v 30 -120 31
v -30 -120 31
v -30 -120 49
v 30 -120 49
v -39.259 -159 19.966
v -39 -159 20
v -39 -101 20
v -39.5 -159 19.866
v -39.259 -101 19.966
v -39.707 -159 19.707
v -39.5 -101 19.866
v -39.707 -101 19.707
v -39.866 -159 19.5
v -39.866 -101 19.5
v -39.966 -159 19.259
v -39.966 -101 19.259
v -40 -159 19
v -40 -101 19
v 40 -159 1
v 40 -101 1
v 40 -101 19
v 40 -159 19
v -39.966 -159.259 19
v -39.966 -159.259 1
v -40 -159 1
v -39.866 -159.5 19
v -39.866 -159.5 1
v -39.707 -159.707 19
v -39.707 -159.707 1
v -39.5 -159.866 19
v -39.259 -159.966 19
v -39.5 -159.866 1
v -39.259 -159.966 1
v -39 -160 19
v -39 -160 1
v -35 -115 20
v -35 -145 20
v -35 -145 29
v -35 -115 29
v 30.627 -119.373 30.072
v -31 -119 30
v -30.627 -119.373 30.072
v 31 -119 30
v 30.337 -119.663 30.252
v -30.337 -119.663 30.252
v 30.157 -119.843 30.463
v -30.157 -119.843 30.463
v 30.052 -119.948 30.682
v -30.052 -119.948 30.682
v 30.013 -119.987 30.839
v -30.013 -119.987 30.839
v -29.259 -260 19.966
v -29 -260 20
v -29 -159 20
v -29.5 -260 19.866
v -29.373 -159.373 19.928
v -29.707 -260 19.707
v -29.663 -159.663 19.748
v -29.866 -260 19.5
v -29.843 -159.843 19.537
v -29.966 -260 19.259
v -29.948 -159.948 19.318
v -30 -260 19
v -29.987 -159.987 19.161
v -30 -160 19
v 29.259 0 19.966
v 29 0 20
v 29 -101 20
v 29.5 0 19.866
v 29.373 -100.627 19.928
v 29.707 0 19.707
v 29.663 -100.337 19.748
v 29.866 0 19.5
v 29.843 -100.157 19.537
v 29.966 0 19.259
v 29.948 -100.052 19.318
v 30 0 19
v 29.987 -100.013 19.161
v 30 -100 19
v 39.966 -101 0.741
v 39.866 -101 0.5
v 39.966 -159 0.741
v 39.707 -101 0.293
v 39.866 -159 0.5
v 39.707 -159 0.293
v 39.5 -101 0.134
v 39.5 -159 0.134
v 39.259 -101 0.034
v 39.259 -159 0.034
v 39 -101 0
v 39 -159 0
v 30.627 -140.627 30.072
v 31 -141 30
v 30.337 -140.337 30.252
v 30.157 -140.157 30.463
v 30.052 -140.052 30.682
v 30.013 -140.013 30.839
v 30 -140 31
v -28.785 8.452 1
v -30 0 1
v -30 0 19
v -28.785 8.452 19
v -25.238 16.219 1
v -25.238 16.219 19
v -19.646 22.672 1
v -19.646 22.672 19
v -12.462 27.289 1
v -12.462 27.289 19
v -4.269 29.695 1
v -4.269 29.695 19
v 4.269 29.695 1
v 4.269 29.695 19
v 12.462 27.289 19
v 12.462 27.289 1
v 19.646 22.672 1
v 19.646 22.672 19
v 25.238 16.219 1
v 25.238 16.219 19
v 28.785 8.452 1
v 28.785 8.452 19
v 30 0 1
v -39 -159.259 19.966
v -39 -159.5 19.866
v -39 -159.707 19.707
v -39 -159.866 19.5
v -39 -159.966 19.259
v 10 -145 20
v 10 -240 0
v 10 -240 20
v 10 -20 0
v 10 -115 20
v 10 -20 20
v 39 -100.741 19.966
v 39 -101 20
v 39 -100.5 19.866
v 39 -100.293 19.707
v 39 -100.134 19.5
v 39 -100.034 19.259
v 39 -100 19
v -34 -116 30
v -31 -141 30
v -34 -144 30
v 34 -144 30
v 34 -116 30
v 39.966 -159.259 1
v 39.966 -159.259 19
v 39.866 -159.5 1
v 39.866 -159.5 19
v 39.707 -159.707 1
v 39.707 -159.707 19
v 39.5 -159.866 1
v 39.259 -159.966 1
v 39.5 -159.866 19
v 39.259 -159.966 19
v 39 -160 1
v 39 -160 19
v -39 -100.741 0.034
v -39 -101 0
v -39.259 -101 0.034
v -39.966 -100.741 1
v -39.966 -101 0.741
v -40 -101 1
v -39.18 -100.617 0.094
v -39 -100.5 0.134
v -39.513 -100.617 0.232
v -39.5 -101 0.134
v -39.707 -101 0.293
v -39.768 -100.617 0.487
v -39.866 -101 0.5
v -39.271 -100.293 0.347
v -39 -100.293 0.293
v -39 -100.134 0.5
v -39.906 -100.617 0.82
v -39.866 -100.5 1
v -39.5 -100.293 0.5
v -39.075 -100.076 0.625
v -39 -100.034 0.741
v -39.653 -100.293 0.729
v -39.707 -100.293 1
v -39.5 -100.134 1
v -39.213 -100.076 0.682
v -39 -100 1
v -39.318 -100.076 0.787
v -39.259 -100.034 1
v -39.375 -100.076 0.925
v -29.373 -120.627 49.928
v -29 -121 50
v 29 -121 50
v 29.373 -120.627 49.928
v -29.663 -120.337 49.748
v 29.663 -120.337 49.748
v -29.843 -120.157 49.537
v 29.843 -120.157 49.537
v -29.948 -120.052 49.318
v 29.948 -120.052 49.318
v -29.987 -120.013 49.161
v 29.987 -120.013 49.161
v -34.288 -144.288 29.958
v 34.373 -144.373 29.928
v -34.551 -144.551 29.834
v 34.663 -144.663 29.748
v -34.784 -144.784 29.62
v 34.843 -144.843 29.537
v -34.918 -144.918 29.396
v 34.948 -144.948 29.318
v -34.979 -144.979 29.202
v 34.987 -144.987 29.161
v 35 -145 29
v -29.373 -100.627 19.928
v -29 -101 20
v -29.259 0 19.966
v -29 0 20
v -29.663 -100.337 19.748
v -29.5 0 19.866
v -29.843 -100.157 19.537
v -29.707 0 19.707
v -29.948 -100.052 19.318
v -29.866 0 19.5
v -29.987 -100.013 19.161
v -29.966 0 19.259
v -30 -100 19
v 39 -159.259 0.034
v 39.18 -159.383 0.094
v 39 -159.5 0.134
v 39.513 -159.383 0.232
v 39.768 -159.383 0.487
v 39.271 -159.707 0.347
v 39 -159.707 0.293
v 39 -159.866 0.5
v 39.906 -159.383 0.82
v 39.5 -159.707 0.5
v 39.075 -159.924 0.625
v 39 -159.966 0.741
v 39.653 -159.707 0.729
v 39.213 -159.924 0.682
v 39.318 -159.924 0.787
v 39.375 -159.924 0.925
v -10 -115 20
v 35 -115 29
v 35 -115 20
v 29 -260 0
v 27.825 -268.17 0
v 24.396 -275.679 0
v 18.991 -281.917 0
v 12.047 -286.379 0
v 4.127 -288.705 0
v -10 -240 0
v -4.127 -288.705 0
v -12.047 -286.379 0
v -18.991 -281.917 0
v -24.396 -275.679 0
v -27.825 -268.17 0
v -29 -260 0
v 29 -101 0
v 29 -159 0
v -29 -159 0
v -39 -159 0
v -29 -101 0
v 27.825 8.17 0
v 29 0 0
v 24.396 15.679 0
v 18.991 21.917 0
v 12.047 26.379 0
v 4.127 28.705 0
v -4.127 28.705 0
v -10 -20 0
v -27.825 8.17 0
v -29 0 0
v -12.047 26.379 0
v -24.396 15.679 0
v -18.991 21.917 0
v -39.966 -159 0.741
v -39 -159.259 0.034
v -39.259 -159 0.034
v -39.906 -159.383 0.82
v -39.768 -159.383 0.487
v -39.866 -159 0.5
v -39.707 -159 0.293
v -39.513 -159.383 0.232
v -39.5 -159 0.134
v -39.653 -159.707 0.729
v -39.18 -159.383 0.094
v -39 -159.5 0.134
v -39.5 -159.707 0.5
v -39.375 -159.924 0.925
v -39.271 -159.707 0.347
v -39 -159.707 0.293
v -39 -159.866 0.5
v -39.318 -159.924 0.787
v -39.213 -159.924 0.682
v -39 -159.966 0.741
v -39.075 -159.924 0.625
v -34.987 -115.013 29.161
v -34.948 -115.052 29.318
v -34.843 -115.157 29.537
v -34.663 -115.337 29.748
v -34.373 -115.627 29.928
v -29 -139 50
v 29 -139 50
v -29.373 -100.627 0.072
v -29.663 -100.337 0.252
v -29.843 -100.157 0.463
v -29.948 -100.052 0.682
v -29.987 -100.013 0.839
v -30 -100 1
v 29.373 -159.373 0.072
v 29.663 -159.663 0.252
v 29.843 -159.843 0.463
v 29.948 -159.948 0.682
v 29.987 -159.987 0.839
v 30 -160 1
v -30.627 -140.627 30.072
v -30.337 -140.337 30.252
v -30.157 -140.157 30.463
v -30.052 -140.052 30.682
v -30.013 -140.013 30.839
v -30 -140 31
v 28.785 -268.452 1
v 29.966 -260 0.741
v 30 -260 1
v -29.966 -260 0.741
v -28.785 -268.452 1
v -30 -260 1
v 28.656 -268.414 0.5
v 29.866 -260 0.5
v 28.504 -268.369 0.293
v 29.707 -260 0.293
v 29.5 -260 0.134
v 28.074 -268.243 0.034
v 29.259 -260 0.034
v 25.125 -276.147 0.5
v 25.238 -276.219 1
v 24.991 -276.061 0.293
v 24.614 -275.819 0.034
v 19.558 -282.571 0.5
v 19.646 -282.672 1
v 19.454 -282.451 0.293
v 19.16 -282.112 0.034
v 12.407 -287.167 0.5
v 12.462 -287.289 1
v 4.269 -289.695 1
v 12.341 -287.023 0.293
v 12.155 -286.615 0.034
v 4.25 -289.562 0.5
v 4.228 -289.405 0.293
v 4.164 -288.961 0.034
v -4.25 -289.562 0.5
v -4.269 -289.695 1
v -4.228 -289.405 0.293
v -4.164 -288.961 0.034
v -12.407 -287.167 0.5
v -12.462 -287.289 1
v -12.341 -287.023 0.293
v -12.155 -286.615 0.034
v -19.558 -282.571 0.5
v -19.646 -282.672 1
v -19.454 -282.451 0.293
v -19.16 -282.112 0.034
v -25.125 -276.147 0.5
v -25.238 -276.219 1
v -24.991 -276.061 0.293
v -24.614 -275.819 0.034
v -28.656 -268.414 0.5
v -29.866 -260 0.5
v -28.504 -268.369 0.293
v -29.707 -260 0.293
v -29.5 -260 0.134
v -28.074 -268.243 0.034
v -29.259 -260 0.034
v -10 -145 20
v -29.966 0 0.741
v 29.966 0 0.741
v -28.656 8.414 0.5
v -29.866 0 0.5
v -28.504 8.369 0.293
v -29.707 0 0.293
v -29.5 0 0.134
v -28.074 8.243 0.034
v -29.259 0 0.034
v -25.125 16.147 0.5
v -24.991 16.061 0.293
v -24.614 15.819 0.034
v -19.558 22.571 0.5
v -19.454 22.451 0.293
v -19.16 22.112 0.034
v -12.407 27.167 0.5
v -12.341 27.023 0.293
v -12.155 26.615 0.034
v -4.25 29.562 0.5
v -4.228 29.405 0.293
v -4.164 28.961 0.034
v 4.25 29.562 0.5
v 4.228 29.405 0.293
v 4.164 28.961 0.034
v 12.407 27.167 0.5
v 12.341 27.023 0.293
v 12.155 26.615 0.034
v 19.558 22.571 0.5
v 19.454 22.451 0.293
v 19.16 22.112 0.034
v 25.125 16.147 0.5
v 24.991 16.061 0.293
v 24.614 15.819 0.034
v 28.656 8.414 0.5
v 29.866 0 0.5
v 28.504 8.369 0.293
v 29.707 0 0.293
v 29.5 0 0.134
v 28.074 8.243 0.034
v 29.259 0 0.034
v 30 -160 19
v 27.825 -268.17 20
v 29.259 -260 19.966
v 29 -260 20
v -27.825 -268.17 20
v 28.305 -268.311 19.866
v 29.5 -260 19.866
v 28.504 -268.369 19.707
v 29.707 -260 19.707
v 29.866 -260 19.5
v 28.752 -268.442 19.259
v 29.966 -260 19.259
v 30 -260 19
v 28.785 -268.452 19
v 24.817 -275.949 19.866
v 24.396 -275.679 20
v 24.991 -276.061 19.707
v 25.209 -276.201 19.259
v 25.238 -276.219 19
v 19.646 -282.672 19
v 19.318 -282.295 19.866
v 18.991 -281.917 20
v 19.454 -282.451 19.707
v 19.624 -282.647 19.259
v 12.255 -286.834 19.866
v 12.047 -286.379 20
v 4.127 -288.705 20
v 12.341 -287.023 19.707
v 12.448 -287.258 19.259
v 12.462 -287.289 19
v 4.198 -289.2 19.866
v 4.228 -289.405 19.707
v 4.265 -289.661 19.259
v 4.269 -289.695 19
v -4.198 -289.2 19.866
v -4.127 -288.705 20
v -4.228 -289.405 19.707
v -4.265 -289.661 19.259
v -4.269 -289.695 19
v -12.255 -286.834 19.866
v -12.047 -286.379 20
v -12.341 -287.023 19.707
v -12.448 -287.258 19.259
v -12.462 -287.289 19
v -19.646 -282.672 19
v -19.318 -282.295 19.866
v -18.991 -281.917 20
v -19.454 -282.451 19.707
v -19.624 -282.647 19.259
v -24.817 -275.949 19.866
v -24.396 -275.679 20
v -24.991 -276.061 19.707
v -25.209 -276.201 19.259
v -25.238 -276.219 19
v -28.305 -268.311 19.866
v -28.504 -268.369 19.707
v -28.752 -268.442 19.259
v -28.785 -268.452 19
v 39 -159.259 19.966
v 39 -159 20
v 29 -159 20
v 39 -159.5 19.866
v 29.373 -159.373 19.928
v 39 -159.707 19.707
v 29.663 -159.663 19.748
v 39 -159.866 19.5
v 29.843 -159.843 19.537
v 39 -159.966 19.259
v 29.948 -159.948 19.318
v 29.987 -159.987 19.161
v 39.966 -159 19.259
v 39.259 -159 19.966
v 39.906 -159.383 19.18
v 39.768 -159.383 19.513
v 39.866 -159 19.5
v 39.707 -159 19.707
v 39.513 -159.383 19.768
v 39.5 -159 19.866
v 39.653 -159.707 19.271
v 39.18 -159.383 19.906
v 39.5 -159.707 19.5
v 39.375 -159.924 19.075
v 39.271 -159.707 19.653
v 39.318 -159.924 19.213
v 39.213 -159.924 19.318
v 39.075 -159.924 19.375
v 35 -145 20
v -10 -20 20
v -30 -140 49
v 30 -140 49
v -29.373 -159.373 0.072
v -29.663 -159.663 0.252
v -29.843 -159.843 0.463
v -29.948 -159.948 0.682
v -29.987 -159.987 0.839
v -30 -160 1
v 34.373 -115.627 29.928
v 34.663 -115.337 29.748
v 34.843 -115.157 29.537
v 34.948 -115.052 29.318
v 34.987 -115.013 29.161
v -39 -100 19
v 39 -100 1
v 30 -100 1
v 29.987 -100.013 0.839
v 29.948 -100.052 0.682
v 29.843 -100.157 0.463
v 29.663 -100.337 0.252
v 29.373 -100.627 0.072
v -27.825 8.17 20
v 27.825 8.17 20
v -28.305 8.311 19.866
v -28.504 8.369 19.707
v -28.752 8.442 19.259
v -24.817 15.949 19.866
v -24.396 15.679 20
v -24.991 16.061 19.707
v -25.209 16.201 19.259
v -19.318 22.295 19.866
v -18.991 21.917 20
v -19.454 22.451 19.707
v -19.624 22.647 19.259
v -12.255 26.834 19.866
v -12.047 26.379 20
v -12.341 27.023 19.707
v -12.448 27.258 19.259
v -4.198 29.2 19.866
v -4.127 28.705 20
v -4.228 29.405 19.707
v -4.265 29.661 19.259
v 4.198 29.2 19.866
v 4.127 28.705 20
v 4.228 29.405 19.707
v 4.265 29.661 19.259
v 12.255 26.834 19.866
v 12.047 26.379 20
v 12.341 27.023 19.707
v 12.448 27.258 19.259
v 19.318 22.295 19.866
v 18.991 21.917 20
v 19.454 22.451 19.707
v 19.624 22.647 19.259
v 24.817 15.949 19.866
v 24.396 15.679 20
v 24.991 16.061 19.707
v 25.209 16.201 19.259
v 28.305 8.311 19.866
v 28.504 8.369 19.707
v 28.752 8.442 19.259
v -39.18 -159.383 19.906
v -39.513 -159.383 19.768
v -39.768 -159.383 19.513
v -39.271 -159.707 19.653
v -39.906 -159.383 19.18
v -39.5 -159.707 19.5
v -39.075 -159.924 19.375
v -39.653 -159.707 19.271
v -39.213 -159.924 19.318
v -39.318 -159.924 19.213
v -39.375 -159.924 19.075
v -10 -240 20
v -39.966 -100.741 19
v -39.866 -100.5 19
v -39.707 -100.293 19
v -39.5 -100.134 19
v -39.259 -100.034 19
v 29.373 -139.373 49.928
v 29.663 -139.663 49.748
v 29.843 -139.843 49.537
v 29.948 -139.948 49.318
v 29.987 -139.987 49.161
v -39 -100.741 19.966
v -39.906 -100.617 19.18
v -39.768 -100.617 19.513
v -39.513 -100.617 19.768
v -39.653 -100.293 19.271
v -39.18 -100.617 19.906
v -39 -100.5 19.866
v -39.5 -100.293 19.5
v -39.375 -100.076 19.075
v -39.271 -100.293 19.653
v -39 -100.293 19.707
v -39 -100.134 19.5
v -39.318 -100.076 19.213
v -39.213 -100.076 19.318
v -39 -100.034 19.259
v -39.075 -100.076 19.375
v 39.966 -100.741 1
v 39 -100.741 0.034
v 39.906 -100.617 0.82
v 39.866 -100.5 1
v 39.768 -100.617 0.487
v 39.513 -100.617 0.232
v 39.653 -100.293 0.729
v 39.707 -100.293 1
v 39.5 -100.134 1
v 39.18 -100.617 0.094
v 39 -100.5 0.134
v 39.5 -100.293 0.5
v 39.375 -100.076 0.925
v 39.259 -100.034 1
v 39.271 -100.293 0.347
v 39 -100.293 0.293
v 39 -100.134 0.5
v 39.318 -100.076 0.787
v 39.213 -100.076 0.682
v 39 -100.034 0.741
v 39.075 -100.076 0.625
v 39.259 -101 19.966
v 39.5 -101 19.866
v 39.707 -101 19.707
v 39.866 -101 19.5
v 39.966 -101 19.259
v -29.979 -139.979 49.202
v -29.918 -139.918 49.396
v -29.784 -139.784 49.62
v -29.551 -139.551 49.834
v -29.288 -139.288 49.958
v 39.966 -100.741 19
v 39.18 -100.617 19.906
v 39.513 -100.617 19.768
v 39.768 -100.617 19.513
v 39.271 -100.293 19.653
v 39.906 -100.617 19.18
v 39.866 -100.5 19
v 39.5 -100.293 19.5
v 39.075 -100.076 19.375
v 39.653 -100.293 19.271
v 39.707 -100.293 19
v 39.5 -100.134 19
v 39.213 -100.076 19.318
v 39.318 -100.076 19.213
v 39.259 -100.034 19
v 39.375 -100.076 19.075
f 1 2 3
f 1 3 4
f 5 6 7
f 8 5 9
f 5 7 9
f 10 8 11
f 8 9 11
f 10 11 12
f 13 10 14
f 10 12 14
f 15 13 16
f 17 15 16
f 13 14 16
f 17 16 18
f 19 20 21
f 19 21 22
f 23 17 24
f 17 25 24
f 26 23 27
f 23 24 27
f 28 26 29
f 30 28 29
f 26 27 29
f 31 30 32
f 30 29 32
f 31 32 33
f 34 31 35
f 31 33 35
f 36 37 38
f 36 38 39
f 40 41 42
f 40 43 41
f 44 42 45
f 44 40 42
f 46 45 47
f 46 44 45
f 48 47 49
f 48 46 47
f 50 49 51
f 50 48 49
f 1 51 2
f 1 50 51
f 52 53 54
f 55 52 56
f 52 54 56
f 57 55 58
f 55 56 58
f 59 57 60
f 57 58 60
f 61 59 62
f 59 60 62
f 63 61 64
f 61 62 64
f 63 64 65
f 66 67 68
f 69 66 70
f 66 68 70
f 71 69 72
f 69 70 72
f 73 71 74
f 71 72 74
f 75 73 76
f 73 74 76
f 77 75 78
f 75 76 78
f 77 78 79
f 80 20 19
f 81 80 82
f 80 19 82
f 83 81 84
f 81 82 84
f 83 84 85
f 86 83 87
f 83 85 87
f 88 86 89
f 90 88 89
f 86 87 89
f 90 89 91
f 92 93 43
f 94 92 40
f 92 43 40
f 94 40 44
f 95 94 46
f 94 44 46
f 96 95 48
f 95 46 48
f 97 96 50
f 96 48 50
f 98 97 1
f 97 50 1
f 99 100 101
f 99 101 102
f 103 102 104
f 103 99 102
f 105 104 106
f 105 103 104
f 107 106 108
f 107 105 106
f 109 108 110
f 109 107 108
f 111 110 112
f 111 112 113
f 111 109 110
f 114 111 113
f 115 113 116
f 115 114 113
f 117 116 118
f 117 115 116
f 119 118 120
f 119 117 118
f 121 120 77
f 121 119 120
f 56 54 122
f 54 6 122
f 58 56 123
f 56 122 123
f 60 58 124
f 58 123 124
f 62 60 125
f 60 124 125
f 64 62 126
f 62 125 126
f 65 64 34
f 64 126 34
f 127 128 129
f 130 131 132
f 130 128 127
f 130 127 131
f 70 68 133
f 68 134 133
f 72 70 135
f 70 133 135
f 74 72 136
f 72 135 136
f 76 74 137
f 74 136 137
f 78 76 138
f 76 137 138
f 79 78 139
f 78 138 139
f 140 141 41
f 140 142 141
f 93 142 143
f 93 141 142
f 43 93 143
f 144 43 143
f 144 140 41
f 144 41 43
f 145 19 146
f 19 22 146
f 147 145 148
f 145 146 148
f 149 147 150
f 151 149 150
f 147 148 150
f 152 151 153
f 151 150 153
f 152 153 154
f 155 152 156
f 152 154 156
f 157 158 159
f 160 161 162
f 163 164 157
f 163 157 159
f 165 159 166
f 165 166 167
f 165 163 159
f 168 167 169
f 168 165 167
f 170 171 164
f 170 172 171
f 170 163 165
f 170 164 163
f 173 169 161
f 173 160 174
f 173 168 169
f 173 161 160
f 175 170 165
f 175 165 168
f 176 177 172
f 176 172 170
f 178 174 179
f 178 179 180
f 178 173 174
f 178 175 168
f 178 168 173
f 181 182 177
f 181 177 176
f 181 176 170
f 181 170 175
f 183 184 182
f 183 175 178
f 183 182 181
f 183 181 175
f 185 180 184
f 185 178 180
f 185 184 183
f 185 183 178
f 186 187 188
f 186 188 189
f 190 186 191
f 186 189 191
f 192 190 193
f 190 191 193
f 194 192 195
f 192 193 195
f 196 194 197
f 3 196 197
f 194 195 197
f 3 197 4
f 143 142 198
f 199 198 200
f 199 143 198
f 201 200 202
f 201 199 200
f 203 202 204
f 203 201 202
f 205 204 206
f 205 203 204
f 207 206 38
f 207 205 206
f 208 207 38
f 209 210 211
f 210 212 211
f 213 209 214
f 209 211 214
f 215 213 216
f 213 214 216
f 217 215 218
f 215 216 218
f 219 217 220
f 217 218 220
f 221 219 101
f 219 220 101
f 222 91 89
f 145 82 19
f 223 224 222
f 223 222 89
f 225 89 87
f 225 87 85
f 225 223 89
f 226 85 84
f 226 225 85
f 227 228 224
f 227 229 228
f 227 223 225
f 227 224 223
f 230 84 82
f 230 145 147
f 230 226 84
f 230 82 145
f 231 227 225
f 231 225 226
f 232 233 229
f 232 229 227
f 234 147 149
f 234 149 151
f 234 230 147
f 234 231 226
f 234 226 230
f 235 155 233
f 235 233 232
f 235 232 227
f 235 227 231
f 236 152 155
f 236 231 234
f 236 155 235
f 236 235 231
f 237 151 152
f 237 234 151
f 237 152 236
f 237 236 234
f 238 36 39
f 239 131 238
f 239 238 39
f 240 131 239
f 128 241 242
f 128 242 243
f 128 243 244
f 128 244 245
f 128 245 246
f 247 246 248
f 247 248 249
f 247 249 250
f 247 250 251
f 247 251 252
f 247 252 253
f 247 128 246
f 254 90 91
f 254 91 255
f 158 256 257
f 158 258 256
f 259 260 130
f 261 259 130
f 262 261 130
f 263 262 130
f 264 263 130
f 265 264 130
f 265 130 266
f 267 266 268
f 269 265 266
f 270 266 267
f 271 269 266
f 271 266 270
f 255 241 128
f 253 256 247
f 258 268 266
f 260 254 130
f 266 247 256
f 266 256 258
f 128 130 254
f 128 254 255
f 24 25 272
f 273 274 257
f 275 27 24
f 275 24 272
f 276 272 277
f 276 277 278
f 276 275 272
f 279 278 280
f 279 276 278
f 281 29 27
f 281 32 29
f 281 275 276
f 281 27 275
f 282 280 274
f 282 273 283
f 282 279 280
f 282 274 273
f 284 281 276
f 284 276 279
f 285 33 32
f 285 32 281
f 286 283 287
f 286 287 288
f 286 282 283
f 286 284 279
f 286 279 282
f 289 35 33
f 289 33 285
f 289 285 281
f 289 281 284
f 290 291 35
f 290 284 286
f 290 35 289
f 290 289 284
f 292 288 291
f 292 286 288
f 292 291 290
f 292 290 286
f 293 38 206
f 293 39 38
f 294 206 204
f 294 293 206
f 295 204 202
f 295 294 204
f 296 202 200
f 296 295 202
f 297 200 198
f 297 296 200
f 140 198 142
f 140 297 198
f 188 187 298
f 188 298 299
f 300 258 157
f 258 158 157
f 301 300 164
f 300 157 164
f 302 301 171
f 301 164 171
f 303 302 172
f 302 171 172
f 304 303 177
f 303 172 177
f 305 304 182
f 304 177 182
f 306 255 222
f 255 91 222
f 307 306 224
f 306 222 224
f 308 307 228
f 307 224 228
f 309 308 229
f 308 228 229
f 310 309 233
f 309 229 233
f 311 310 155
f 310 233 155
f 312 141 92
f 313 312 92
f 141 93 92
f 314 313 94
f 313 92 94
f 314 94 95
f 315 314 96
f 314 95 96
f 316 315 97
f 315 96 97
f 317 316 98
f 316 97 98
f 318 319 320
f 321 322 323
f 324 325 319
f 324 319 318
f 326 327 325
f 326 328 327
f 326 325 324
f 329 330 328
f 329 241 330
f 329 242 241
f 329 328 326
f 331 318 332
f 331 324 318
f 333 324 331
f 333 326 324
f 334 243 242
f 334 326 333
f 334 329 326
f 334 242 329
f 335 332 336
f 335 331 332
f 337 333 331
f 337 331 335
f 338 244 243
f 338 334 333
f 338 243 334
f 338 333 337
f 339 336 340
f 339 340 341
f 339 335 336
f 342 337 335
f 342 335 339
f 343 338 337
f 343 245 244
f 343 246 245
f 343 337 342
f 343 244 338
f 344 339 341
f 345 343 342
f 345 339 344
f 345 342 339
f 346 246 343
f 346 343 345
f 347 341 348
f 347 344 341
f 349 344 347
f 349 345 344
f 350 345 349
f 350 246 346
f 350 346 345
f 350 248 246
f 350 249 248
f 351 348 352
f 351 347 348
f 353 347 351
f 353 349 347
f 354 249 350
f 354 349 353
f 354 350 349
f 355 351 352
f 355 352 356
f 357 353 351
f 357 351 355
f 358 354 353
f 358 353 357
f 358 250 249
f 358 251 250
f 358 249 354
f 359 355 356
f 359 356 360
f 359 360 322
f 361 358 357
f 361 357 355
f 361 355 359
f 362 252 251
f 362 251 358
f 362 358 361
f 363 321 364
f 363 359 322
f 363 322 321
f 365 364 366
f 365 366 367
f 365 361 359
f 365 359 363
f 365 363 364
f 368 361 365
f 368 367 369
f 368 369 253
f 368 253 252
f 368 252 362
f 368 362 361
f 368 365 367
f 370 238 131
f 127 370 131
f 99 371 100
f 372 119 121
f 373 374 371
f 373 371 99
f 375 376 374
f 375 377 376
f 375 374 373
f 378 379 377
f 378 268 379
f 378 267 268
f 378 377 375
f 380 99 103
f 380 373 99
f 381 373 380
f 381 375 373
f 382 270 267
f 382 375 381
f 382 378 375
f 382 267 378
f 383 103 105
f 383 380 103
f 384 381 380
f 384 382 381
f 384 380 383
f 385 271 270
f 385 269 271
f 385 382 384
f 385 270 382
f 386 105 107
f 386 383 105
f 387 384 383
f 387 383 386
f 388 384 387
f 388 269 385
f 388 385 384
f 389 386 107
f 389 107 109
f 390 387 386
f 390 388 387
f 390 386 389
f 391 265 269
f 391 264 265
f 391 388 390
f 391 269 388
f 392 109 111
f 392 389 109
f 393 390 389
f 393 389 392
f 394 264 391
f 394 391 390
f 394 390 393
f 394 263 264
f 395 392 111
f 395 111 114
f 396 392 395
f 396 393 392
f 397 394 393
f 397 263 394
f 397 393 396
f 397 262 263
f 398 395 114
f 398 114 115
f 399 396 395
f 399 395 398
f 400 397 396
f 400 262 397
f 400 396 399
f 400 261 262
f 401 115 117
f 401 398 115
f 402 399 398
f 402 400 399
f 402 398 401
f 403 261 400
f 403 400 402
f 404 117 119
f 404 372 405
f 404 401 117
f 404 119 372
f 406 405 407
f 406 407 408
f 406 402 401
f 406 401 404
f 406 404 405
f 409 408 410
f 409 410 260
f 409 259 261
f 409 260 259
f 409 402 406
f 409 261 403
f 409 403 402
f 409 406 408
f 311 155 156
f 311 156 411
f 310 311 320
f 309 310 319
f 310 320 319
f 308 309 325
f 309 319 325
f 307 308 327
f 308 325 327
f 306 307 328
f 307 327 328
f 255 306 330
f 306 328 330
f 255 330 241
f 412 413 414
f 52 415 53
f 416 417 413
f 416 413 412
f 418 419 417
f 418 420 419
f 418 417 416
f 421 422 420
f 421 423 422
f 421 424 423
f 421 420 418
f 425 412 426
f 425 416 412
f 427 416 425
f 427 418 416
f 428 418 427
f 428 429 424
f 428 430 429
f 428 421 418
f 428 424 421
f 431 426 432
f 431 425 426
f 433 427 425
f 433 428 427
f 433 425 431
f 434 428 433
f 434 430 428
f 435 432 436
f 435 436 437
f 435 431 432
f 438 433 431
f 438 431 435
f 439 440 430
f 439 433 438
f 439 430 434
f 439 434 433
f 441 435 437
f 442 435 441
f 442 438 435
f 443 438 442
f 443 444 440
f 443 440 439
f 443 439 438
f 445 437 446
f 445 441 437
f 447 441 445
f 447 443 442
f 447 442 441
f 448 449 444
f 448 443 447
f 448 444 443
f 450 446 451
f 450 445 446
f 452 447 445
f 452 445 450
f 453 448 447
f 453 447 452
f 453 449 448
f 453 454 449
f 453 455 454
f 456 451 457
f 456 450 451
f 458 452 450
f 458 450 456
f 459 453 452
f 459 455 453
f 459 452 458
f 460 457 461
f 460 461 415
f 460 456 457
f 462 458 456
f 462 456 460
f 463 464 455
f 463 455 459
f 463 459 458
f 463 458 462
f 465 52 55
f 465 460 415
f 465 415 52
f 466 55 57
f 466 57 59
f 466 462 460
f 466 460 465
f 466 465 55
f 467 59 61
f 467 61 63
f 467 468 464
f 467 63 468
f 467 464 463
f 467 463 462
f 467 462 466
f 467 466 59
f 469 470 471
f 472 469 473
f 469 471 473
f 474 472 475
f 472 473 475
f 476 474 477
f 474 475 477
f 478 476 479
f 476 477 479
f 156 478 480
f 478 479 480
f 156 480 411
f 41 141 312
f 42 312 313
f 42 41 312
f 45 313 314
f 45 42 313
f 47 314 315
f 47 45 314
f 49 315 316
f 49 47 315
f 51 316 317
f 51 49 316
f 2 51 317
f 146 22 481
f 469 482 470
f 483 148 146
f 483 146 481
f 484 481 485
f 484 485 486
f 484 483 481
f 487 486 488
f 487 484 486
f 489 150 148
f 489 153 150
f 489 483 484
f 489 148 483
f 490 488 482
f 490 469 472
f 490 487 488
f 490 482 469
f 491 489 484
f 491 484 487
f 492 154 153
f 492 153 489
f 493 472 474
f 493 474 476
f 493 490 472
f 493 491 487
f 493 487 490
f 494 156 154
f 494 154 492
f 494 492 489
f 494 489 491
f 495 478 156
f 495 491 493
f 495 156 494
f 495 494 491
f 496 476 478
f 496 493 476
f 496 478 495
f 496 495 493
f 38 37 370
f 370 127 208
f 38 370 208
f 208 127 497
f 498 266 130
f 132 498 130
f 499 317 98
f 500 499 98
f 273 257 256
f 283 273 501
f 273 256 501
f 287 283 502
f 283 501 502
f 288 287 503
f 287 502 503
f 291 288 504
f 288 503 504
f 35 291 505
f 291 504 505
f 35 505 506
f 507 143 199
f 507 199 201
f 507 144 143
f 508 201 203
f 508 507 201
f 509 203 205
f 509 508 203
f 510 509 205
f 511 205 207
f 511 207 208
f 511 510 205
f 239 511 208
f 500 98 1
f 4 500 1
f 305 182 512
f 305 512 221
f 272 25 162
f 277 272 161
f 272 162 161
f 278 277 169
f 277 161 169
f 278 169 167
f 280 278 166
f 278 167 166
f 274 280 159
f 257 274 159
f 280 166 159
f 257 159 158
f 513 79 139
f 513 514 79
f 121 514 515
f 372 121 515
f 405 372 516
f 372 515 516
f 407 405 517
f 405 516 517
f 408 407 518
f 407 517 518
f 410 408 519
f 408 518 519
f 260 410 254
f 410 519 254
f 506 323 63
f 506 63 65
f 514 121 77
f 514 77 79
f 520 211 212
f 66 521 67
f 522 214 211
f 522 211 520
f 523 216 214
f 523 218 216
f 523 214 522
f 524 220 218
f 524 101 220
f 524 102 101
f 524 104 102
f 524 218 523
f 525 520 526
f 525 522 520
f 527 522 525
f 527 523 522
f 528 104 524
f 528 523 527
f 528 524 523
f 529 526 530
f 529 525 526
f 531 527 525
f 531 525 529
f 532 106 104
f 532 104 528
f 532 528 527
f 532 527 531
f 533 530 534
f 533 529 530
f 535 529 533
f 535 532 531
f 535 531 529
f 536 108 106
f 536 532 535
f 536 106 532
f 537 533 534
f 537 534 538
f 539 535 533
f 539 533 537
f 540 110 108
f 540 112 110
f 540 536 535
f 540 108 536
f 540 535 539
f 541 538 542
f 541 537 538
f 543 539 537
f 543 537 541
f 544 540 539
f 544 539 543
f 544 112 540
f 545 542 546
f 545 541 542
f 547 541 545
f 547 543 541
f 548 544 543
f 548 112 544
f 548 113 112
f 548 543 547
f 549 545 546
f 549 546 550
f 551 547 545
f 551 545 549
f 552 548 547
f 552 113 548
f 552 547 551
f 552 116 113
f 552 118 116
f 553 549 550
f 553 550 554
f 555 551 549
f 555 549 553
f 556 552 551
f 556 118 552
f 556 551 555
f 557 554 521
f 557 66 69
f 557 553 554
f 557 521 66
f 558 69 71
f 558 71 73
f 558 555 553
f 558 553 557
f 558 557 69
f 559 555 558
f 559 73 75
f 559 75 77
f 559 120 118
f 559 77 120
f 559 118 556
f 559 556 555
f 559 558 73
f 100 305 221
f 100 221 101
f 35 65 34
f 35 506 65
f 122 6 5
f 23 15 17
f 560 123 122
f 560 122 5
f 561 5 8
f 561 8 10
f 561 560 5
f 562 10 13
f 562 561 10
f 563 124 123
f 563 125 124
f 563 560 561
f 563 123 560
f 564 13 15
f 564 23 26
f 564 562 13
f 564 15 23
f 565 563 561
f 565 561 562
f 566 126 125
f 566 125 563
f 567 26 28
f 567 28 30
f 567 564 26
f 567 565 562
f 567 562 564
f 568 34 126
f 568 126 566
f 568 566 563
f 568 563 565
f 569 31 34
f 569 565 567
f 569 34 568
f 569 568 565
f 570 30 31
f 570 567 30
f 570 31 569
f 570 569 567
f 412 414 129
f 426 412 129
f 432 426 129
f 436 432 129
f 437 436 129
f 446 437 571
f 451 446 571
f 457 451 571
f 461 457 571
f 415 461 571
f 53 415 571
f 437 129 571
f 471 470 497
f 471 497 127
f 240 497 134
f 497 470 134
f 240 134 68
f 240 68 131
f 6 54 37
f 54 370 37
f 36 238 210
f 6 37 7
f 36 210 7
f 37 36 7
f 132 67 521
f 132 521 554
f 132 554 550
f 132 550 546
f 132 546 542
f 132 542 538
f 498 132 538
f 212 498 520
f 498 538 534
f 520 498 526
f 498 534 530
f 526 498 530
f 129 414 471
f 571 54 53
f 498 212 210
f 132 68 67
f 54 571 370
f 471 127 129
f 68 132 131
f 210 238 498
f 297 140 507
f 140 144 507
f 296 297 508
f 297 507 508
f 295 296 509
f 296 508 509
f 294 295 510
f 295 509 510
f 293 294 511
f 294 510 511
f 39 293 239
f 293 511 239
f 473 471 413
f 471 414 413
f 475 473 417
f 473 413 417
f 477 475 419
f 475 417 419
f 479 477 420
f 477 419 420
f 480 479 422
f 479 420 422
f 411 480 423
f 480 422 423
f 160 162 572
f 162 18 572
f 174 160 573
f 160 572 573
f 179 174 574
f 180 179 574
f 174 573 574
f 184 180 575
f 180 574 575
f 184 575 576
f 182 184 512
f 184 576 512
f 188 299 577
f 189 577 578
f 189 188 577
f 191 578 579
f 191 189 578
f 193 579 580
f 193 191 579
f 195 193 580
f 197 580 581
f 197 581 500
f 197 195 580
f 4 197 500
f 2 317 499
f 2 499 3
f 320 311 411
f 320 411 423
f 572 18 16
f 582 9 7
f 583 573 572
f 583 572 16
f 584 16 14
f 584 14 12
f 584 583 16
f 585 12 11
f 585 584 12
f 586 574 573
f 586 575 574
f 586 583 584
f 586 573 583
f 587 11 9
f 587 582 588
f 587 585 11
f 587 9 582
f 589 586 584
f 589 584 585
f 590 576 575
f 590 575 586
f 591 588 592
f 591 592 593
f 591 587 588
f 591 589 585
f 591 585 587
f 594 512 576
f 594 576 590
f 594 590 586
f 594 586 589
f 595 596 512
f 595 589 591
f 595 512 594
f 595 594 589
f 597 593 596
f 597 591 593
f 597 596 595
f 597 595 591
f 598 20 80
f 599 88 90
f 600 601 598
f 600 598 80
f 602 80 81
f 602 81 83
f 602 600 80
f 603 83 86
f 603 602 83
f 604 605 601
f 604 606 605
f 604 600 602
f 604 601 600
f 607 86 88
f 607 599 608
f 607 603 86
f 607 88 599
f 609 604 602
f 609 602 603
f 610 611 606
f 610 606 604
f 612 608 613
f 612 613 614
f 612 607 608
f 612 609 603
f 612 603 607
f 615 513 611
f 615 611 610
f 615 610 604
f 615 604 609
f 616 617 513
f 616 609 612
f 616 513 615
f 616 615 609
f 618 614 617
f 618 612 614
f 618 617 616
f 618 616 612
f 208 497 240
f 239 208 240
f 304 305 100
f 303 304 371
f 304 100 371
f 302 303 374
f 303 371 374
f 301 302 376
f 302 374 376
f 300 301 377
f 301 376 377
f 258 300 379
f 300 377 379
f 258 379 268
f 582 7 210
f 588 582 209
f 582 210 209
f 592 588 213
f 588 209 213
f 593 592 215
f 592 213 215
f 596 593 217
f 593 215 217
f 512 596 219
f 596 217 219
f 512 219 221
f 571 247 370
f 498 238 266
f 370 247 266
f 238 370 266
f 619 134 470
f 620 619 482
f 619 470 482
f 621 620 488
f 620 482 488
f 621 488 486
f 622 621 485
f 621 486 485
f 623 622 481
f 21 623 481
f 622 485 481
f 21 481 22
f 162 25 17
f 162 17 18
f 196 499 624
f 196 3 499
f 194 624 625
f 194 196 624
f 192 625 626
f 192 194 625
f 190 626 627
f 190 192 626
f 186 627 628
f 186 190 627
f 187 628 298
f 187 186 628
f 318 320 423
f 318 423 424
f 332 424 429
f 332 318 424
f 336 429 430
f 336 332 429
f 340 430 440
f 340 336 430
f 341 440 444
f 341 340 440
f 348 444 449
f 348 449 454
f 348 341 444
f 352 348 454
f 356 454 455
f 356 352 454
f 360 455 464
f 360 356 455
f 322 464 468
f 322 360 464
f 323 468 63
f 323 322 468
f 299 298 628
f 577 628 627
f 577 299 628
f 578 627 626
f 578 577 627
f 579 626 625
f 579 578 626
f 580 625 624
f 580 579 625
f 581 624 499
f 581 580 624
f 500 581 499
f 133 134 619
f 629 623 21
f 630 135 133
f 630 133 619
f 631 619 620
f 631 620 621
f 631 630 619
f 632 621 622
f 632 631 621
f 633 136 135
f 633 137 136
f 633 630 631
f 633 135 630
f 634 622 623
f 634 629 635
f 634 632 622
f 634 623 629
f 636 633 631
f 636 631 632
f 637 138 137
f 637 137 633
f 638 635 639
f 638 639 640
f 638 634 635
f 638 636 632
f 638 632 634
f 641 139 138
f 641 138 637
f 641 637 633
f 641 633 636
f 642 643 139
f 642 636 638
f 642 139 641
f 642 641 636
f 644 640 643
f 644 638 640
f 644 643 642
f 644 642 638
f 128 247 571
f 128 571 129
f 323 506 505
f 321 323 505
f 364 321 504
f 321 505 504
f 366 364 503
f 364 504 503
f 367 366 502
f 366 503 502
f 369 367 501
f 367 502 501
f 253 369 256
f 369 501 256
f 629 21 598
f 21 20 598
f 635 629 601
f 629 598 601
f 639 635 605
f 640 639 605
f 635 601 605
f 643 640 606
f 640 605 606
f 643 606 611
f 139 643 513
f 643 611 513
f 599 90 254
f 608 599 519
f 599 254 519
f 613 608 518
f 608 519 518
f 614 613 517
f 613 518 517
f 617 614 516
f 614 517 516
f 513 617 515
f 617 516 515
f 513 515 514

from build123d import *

# Parameters (mm, degrees)
SKETCH2_W           = 20
SKETCH2_H           = 220
BOSS_EXTRUDE1_DEPTH = 20
SKETCH3_W           = 60
SKETCH3_H           = 20
BOSS_EXTRUDE2_DEPTH = 30
SKETCH4_W           = 70
SKETCH4_H           = 30
SKETCH4_W_2         = 60
SKETCH4_H_2         = 20
BOSS_EXTRUDE3_DEPTH = 10
FILLET1_R           = 1
FILLET2_R           = 1
FILLET3_R           = 1


with BuildPart() as part:
    # Sketch2 → Boss-Extrude1 (new body)
    with BuildSketch(Plane.XY):
        with BuildLine():
            Line((30, 0), (30, -100))
            Line((30, -100), (40, -100))
            Line((40, -100), (40, -160))
            Line((40, -160), (30, -160))
            Line((30, -160), (30, -260))
            ThreePointArc((30, -260), (0, -290), (-30, -260))
            Line((-30, -260), (-30, -160))
            Line((-30, -160), (-40, -160))
            Line((-40, -160), (-40, -100))
            Line((-40, -100), (-30, -100))
            Line((-30, -100), (-30, 0))
            ThreePointArc((-30, 0), (0, 30), (30, 0))
        make_face()
        with Locations((0, -130)):
            Rectangle(SKETCH2_W, SKETCH2_H, mode=Mode.SUBTRACT)
    extrude(amount=BOSS_EXTRUDE1_DEPTH)

    # Sketch3 → Boss-Extrude2 (add)
    with BuildSketch(Plane.XY.offset(20)):
        with Locations((0, -130)):
            Rectangle(SKETCH3_W, SKETCH3_H)
    extrude(amount=BOSS_EXTRUDE2_DEPTH)

    # Sketch4 → Boss-Extrude3 (add)
    with BuildSketch(Plane.XY.offset(20)):
        with Locations((0, -130)):
            Rectangle(SKETCH4_W, SKETCH4_H)
        with Locations((0, -130)):
            Rectangle(SKETCH4_W_2, SKETCH4_H_2, mode=Mode.SUBTRACT)
    extrude(amount=BOSS_EXTRUDE3_DEPTH)

    # Fillet1
    fillet1_edges = [part.edges().sort_by_distance(p)[0] for p in [
        (30, -130, 50),
        (0, -120, 50),
        (-30, -130, 50),
        (0, -140, 50),
        (35, -130, 30),
        (0, -115, 30),
        (-35, -130, 30),
        (0, -145, 30),
        (0, -140, 30),
        (30, -130, 30),
        (0, -120, 30),
        (-30, -130, 30),
    ]]
    fillet(fillet1_edges, radius=FILLET1_R)

    # Fillet2
    fillet2_edges = [part.edges().sort_by_distance(p)[0] for p in [
        (30, -50, 0),
        (40, -130, 0),
        (30, -210, 0),
        (0, -290, 0),
        (-30, -210, 0),
        (-40, -130, 0),
        (-30, -50, 0),
        (0, 30, 0),
        (-40, -130, 20),
        (-30, -210, 20),
        (0, -290, 20),
        (30, -210, 20),
        (40, -130, 20),
        (30, -50, 20),
        (0, 30, 20),
        (-30, -50, 20),
    ]]
    fillet(fillet2_edges, radius=FILLET2_R)

    # Fillet3
    fillet3_edges = [part.edges().sort_by_distance(p)[0] for p in [
        (-34, -160, 0),
        (-39.707106781, -160, 0.292893219),
        (-40, -160, 10),
        (-39.707106781, -160, 19.707106781),
        (34, -160, 0),
        (39.707106781, -160, 0.292893219),
        (40, -160, 10),
        (39.707106781, -160, 19.707106781),
        (34, -100, 0),
        (39.707106781, -100, 0.292893219),
        (40, -100, 10),
        (39.707106781, -100, 19.707106781),
        (-34, -100, 0),
        (-39.707106781, -100, 0.292893219),
        (-40, -100, 10),
        (-39.707106781, -100, 19.707106781),
        (-34, -160, 20),
        (34, -160, 20),
        (34, -100, 20),
        (-34, -100, 20),
    ]]
    fillet(fillet3_edges, radius=FILLET3_R)


solid = part.part
